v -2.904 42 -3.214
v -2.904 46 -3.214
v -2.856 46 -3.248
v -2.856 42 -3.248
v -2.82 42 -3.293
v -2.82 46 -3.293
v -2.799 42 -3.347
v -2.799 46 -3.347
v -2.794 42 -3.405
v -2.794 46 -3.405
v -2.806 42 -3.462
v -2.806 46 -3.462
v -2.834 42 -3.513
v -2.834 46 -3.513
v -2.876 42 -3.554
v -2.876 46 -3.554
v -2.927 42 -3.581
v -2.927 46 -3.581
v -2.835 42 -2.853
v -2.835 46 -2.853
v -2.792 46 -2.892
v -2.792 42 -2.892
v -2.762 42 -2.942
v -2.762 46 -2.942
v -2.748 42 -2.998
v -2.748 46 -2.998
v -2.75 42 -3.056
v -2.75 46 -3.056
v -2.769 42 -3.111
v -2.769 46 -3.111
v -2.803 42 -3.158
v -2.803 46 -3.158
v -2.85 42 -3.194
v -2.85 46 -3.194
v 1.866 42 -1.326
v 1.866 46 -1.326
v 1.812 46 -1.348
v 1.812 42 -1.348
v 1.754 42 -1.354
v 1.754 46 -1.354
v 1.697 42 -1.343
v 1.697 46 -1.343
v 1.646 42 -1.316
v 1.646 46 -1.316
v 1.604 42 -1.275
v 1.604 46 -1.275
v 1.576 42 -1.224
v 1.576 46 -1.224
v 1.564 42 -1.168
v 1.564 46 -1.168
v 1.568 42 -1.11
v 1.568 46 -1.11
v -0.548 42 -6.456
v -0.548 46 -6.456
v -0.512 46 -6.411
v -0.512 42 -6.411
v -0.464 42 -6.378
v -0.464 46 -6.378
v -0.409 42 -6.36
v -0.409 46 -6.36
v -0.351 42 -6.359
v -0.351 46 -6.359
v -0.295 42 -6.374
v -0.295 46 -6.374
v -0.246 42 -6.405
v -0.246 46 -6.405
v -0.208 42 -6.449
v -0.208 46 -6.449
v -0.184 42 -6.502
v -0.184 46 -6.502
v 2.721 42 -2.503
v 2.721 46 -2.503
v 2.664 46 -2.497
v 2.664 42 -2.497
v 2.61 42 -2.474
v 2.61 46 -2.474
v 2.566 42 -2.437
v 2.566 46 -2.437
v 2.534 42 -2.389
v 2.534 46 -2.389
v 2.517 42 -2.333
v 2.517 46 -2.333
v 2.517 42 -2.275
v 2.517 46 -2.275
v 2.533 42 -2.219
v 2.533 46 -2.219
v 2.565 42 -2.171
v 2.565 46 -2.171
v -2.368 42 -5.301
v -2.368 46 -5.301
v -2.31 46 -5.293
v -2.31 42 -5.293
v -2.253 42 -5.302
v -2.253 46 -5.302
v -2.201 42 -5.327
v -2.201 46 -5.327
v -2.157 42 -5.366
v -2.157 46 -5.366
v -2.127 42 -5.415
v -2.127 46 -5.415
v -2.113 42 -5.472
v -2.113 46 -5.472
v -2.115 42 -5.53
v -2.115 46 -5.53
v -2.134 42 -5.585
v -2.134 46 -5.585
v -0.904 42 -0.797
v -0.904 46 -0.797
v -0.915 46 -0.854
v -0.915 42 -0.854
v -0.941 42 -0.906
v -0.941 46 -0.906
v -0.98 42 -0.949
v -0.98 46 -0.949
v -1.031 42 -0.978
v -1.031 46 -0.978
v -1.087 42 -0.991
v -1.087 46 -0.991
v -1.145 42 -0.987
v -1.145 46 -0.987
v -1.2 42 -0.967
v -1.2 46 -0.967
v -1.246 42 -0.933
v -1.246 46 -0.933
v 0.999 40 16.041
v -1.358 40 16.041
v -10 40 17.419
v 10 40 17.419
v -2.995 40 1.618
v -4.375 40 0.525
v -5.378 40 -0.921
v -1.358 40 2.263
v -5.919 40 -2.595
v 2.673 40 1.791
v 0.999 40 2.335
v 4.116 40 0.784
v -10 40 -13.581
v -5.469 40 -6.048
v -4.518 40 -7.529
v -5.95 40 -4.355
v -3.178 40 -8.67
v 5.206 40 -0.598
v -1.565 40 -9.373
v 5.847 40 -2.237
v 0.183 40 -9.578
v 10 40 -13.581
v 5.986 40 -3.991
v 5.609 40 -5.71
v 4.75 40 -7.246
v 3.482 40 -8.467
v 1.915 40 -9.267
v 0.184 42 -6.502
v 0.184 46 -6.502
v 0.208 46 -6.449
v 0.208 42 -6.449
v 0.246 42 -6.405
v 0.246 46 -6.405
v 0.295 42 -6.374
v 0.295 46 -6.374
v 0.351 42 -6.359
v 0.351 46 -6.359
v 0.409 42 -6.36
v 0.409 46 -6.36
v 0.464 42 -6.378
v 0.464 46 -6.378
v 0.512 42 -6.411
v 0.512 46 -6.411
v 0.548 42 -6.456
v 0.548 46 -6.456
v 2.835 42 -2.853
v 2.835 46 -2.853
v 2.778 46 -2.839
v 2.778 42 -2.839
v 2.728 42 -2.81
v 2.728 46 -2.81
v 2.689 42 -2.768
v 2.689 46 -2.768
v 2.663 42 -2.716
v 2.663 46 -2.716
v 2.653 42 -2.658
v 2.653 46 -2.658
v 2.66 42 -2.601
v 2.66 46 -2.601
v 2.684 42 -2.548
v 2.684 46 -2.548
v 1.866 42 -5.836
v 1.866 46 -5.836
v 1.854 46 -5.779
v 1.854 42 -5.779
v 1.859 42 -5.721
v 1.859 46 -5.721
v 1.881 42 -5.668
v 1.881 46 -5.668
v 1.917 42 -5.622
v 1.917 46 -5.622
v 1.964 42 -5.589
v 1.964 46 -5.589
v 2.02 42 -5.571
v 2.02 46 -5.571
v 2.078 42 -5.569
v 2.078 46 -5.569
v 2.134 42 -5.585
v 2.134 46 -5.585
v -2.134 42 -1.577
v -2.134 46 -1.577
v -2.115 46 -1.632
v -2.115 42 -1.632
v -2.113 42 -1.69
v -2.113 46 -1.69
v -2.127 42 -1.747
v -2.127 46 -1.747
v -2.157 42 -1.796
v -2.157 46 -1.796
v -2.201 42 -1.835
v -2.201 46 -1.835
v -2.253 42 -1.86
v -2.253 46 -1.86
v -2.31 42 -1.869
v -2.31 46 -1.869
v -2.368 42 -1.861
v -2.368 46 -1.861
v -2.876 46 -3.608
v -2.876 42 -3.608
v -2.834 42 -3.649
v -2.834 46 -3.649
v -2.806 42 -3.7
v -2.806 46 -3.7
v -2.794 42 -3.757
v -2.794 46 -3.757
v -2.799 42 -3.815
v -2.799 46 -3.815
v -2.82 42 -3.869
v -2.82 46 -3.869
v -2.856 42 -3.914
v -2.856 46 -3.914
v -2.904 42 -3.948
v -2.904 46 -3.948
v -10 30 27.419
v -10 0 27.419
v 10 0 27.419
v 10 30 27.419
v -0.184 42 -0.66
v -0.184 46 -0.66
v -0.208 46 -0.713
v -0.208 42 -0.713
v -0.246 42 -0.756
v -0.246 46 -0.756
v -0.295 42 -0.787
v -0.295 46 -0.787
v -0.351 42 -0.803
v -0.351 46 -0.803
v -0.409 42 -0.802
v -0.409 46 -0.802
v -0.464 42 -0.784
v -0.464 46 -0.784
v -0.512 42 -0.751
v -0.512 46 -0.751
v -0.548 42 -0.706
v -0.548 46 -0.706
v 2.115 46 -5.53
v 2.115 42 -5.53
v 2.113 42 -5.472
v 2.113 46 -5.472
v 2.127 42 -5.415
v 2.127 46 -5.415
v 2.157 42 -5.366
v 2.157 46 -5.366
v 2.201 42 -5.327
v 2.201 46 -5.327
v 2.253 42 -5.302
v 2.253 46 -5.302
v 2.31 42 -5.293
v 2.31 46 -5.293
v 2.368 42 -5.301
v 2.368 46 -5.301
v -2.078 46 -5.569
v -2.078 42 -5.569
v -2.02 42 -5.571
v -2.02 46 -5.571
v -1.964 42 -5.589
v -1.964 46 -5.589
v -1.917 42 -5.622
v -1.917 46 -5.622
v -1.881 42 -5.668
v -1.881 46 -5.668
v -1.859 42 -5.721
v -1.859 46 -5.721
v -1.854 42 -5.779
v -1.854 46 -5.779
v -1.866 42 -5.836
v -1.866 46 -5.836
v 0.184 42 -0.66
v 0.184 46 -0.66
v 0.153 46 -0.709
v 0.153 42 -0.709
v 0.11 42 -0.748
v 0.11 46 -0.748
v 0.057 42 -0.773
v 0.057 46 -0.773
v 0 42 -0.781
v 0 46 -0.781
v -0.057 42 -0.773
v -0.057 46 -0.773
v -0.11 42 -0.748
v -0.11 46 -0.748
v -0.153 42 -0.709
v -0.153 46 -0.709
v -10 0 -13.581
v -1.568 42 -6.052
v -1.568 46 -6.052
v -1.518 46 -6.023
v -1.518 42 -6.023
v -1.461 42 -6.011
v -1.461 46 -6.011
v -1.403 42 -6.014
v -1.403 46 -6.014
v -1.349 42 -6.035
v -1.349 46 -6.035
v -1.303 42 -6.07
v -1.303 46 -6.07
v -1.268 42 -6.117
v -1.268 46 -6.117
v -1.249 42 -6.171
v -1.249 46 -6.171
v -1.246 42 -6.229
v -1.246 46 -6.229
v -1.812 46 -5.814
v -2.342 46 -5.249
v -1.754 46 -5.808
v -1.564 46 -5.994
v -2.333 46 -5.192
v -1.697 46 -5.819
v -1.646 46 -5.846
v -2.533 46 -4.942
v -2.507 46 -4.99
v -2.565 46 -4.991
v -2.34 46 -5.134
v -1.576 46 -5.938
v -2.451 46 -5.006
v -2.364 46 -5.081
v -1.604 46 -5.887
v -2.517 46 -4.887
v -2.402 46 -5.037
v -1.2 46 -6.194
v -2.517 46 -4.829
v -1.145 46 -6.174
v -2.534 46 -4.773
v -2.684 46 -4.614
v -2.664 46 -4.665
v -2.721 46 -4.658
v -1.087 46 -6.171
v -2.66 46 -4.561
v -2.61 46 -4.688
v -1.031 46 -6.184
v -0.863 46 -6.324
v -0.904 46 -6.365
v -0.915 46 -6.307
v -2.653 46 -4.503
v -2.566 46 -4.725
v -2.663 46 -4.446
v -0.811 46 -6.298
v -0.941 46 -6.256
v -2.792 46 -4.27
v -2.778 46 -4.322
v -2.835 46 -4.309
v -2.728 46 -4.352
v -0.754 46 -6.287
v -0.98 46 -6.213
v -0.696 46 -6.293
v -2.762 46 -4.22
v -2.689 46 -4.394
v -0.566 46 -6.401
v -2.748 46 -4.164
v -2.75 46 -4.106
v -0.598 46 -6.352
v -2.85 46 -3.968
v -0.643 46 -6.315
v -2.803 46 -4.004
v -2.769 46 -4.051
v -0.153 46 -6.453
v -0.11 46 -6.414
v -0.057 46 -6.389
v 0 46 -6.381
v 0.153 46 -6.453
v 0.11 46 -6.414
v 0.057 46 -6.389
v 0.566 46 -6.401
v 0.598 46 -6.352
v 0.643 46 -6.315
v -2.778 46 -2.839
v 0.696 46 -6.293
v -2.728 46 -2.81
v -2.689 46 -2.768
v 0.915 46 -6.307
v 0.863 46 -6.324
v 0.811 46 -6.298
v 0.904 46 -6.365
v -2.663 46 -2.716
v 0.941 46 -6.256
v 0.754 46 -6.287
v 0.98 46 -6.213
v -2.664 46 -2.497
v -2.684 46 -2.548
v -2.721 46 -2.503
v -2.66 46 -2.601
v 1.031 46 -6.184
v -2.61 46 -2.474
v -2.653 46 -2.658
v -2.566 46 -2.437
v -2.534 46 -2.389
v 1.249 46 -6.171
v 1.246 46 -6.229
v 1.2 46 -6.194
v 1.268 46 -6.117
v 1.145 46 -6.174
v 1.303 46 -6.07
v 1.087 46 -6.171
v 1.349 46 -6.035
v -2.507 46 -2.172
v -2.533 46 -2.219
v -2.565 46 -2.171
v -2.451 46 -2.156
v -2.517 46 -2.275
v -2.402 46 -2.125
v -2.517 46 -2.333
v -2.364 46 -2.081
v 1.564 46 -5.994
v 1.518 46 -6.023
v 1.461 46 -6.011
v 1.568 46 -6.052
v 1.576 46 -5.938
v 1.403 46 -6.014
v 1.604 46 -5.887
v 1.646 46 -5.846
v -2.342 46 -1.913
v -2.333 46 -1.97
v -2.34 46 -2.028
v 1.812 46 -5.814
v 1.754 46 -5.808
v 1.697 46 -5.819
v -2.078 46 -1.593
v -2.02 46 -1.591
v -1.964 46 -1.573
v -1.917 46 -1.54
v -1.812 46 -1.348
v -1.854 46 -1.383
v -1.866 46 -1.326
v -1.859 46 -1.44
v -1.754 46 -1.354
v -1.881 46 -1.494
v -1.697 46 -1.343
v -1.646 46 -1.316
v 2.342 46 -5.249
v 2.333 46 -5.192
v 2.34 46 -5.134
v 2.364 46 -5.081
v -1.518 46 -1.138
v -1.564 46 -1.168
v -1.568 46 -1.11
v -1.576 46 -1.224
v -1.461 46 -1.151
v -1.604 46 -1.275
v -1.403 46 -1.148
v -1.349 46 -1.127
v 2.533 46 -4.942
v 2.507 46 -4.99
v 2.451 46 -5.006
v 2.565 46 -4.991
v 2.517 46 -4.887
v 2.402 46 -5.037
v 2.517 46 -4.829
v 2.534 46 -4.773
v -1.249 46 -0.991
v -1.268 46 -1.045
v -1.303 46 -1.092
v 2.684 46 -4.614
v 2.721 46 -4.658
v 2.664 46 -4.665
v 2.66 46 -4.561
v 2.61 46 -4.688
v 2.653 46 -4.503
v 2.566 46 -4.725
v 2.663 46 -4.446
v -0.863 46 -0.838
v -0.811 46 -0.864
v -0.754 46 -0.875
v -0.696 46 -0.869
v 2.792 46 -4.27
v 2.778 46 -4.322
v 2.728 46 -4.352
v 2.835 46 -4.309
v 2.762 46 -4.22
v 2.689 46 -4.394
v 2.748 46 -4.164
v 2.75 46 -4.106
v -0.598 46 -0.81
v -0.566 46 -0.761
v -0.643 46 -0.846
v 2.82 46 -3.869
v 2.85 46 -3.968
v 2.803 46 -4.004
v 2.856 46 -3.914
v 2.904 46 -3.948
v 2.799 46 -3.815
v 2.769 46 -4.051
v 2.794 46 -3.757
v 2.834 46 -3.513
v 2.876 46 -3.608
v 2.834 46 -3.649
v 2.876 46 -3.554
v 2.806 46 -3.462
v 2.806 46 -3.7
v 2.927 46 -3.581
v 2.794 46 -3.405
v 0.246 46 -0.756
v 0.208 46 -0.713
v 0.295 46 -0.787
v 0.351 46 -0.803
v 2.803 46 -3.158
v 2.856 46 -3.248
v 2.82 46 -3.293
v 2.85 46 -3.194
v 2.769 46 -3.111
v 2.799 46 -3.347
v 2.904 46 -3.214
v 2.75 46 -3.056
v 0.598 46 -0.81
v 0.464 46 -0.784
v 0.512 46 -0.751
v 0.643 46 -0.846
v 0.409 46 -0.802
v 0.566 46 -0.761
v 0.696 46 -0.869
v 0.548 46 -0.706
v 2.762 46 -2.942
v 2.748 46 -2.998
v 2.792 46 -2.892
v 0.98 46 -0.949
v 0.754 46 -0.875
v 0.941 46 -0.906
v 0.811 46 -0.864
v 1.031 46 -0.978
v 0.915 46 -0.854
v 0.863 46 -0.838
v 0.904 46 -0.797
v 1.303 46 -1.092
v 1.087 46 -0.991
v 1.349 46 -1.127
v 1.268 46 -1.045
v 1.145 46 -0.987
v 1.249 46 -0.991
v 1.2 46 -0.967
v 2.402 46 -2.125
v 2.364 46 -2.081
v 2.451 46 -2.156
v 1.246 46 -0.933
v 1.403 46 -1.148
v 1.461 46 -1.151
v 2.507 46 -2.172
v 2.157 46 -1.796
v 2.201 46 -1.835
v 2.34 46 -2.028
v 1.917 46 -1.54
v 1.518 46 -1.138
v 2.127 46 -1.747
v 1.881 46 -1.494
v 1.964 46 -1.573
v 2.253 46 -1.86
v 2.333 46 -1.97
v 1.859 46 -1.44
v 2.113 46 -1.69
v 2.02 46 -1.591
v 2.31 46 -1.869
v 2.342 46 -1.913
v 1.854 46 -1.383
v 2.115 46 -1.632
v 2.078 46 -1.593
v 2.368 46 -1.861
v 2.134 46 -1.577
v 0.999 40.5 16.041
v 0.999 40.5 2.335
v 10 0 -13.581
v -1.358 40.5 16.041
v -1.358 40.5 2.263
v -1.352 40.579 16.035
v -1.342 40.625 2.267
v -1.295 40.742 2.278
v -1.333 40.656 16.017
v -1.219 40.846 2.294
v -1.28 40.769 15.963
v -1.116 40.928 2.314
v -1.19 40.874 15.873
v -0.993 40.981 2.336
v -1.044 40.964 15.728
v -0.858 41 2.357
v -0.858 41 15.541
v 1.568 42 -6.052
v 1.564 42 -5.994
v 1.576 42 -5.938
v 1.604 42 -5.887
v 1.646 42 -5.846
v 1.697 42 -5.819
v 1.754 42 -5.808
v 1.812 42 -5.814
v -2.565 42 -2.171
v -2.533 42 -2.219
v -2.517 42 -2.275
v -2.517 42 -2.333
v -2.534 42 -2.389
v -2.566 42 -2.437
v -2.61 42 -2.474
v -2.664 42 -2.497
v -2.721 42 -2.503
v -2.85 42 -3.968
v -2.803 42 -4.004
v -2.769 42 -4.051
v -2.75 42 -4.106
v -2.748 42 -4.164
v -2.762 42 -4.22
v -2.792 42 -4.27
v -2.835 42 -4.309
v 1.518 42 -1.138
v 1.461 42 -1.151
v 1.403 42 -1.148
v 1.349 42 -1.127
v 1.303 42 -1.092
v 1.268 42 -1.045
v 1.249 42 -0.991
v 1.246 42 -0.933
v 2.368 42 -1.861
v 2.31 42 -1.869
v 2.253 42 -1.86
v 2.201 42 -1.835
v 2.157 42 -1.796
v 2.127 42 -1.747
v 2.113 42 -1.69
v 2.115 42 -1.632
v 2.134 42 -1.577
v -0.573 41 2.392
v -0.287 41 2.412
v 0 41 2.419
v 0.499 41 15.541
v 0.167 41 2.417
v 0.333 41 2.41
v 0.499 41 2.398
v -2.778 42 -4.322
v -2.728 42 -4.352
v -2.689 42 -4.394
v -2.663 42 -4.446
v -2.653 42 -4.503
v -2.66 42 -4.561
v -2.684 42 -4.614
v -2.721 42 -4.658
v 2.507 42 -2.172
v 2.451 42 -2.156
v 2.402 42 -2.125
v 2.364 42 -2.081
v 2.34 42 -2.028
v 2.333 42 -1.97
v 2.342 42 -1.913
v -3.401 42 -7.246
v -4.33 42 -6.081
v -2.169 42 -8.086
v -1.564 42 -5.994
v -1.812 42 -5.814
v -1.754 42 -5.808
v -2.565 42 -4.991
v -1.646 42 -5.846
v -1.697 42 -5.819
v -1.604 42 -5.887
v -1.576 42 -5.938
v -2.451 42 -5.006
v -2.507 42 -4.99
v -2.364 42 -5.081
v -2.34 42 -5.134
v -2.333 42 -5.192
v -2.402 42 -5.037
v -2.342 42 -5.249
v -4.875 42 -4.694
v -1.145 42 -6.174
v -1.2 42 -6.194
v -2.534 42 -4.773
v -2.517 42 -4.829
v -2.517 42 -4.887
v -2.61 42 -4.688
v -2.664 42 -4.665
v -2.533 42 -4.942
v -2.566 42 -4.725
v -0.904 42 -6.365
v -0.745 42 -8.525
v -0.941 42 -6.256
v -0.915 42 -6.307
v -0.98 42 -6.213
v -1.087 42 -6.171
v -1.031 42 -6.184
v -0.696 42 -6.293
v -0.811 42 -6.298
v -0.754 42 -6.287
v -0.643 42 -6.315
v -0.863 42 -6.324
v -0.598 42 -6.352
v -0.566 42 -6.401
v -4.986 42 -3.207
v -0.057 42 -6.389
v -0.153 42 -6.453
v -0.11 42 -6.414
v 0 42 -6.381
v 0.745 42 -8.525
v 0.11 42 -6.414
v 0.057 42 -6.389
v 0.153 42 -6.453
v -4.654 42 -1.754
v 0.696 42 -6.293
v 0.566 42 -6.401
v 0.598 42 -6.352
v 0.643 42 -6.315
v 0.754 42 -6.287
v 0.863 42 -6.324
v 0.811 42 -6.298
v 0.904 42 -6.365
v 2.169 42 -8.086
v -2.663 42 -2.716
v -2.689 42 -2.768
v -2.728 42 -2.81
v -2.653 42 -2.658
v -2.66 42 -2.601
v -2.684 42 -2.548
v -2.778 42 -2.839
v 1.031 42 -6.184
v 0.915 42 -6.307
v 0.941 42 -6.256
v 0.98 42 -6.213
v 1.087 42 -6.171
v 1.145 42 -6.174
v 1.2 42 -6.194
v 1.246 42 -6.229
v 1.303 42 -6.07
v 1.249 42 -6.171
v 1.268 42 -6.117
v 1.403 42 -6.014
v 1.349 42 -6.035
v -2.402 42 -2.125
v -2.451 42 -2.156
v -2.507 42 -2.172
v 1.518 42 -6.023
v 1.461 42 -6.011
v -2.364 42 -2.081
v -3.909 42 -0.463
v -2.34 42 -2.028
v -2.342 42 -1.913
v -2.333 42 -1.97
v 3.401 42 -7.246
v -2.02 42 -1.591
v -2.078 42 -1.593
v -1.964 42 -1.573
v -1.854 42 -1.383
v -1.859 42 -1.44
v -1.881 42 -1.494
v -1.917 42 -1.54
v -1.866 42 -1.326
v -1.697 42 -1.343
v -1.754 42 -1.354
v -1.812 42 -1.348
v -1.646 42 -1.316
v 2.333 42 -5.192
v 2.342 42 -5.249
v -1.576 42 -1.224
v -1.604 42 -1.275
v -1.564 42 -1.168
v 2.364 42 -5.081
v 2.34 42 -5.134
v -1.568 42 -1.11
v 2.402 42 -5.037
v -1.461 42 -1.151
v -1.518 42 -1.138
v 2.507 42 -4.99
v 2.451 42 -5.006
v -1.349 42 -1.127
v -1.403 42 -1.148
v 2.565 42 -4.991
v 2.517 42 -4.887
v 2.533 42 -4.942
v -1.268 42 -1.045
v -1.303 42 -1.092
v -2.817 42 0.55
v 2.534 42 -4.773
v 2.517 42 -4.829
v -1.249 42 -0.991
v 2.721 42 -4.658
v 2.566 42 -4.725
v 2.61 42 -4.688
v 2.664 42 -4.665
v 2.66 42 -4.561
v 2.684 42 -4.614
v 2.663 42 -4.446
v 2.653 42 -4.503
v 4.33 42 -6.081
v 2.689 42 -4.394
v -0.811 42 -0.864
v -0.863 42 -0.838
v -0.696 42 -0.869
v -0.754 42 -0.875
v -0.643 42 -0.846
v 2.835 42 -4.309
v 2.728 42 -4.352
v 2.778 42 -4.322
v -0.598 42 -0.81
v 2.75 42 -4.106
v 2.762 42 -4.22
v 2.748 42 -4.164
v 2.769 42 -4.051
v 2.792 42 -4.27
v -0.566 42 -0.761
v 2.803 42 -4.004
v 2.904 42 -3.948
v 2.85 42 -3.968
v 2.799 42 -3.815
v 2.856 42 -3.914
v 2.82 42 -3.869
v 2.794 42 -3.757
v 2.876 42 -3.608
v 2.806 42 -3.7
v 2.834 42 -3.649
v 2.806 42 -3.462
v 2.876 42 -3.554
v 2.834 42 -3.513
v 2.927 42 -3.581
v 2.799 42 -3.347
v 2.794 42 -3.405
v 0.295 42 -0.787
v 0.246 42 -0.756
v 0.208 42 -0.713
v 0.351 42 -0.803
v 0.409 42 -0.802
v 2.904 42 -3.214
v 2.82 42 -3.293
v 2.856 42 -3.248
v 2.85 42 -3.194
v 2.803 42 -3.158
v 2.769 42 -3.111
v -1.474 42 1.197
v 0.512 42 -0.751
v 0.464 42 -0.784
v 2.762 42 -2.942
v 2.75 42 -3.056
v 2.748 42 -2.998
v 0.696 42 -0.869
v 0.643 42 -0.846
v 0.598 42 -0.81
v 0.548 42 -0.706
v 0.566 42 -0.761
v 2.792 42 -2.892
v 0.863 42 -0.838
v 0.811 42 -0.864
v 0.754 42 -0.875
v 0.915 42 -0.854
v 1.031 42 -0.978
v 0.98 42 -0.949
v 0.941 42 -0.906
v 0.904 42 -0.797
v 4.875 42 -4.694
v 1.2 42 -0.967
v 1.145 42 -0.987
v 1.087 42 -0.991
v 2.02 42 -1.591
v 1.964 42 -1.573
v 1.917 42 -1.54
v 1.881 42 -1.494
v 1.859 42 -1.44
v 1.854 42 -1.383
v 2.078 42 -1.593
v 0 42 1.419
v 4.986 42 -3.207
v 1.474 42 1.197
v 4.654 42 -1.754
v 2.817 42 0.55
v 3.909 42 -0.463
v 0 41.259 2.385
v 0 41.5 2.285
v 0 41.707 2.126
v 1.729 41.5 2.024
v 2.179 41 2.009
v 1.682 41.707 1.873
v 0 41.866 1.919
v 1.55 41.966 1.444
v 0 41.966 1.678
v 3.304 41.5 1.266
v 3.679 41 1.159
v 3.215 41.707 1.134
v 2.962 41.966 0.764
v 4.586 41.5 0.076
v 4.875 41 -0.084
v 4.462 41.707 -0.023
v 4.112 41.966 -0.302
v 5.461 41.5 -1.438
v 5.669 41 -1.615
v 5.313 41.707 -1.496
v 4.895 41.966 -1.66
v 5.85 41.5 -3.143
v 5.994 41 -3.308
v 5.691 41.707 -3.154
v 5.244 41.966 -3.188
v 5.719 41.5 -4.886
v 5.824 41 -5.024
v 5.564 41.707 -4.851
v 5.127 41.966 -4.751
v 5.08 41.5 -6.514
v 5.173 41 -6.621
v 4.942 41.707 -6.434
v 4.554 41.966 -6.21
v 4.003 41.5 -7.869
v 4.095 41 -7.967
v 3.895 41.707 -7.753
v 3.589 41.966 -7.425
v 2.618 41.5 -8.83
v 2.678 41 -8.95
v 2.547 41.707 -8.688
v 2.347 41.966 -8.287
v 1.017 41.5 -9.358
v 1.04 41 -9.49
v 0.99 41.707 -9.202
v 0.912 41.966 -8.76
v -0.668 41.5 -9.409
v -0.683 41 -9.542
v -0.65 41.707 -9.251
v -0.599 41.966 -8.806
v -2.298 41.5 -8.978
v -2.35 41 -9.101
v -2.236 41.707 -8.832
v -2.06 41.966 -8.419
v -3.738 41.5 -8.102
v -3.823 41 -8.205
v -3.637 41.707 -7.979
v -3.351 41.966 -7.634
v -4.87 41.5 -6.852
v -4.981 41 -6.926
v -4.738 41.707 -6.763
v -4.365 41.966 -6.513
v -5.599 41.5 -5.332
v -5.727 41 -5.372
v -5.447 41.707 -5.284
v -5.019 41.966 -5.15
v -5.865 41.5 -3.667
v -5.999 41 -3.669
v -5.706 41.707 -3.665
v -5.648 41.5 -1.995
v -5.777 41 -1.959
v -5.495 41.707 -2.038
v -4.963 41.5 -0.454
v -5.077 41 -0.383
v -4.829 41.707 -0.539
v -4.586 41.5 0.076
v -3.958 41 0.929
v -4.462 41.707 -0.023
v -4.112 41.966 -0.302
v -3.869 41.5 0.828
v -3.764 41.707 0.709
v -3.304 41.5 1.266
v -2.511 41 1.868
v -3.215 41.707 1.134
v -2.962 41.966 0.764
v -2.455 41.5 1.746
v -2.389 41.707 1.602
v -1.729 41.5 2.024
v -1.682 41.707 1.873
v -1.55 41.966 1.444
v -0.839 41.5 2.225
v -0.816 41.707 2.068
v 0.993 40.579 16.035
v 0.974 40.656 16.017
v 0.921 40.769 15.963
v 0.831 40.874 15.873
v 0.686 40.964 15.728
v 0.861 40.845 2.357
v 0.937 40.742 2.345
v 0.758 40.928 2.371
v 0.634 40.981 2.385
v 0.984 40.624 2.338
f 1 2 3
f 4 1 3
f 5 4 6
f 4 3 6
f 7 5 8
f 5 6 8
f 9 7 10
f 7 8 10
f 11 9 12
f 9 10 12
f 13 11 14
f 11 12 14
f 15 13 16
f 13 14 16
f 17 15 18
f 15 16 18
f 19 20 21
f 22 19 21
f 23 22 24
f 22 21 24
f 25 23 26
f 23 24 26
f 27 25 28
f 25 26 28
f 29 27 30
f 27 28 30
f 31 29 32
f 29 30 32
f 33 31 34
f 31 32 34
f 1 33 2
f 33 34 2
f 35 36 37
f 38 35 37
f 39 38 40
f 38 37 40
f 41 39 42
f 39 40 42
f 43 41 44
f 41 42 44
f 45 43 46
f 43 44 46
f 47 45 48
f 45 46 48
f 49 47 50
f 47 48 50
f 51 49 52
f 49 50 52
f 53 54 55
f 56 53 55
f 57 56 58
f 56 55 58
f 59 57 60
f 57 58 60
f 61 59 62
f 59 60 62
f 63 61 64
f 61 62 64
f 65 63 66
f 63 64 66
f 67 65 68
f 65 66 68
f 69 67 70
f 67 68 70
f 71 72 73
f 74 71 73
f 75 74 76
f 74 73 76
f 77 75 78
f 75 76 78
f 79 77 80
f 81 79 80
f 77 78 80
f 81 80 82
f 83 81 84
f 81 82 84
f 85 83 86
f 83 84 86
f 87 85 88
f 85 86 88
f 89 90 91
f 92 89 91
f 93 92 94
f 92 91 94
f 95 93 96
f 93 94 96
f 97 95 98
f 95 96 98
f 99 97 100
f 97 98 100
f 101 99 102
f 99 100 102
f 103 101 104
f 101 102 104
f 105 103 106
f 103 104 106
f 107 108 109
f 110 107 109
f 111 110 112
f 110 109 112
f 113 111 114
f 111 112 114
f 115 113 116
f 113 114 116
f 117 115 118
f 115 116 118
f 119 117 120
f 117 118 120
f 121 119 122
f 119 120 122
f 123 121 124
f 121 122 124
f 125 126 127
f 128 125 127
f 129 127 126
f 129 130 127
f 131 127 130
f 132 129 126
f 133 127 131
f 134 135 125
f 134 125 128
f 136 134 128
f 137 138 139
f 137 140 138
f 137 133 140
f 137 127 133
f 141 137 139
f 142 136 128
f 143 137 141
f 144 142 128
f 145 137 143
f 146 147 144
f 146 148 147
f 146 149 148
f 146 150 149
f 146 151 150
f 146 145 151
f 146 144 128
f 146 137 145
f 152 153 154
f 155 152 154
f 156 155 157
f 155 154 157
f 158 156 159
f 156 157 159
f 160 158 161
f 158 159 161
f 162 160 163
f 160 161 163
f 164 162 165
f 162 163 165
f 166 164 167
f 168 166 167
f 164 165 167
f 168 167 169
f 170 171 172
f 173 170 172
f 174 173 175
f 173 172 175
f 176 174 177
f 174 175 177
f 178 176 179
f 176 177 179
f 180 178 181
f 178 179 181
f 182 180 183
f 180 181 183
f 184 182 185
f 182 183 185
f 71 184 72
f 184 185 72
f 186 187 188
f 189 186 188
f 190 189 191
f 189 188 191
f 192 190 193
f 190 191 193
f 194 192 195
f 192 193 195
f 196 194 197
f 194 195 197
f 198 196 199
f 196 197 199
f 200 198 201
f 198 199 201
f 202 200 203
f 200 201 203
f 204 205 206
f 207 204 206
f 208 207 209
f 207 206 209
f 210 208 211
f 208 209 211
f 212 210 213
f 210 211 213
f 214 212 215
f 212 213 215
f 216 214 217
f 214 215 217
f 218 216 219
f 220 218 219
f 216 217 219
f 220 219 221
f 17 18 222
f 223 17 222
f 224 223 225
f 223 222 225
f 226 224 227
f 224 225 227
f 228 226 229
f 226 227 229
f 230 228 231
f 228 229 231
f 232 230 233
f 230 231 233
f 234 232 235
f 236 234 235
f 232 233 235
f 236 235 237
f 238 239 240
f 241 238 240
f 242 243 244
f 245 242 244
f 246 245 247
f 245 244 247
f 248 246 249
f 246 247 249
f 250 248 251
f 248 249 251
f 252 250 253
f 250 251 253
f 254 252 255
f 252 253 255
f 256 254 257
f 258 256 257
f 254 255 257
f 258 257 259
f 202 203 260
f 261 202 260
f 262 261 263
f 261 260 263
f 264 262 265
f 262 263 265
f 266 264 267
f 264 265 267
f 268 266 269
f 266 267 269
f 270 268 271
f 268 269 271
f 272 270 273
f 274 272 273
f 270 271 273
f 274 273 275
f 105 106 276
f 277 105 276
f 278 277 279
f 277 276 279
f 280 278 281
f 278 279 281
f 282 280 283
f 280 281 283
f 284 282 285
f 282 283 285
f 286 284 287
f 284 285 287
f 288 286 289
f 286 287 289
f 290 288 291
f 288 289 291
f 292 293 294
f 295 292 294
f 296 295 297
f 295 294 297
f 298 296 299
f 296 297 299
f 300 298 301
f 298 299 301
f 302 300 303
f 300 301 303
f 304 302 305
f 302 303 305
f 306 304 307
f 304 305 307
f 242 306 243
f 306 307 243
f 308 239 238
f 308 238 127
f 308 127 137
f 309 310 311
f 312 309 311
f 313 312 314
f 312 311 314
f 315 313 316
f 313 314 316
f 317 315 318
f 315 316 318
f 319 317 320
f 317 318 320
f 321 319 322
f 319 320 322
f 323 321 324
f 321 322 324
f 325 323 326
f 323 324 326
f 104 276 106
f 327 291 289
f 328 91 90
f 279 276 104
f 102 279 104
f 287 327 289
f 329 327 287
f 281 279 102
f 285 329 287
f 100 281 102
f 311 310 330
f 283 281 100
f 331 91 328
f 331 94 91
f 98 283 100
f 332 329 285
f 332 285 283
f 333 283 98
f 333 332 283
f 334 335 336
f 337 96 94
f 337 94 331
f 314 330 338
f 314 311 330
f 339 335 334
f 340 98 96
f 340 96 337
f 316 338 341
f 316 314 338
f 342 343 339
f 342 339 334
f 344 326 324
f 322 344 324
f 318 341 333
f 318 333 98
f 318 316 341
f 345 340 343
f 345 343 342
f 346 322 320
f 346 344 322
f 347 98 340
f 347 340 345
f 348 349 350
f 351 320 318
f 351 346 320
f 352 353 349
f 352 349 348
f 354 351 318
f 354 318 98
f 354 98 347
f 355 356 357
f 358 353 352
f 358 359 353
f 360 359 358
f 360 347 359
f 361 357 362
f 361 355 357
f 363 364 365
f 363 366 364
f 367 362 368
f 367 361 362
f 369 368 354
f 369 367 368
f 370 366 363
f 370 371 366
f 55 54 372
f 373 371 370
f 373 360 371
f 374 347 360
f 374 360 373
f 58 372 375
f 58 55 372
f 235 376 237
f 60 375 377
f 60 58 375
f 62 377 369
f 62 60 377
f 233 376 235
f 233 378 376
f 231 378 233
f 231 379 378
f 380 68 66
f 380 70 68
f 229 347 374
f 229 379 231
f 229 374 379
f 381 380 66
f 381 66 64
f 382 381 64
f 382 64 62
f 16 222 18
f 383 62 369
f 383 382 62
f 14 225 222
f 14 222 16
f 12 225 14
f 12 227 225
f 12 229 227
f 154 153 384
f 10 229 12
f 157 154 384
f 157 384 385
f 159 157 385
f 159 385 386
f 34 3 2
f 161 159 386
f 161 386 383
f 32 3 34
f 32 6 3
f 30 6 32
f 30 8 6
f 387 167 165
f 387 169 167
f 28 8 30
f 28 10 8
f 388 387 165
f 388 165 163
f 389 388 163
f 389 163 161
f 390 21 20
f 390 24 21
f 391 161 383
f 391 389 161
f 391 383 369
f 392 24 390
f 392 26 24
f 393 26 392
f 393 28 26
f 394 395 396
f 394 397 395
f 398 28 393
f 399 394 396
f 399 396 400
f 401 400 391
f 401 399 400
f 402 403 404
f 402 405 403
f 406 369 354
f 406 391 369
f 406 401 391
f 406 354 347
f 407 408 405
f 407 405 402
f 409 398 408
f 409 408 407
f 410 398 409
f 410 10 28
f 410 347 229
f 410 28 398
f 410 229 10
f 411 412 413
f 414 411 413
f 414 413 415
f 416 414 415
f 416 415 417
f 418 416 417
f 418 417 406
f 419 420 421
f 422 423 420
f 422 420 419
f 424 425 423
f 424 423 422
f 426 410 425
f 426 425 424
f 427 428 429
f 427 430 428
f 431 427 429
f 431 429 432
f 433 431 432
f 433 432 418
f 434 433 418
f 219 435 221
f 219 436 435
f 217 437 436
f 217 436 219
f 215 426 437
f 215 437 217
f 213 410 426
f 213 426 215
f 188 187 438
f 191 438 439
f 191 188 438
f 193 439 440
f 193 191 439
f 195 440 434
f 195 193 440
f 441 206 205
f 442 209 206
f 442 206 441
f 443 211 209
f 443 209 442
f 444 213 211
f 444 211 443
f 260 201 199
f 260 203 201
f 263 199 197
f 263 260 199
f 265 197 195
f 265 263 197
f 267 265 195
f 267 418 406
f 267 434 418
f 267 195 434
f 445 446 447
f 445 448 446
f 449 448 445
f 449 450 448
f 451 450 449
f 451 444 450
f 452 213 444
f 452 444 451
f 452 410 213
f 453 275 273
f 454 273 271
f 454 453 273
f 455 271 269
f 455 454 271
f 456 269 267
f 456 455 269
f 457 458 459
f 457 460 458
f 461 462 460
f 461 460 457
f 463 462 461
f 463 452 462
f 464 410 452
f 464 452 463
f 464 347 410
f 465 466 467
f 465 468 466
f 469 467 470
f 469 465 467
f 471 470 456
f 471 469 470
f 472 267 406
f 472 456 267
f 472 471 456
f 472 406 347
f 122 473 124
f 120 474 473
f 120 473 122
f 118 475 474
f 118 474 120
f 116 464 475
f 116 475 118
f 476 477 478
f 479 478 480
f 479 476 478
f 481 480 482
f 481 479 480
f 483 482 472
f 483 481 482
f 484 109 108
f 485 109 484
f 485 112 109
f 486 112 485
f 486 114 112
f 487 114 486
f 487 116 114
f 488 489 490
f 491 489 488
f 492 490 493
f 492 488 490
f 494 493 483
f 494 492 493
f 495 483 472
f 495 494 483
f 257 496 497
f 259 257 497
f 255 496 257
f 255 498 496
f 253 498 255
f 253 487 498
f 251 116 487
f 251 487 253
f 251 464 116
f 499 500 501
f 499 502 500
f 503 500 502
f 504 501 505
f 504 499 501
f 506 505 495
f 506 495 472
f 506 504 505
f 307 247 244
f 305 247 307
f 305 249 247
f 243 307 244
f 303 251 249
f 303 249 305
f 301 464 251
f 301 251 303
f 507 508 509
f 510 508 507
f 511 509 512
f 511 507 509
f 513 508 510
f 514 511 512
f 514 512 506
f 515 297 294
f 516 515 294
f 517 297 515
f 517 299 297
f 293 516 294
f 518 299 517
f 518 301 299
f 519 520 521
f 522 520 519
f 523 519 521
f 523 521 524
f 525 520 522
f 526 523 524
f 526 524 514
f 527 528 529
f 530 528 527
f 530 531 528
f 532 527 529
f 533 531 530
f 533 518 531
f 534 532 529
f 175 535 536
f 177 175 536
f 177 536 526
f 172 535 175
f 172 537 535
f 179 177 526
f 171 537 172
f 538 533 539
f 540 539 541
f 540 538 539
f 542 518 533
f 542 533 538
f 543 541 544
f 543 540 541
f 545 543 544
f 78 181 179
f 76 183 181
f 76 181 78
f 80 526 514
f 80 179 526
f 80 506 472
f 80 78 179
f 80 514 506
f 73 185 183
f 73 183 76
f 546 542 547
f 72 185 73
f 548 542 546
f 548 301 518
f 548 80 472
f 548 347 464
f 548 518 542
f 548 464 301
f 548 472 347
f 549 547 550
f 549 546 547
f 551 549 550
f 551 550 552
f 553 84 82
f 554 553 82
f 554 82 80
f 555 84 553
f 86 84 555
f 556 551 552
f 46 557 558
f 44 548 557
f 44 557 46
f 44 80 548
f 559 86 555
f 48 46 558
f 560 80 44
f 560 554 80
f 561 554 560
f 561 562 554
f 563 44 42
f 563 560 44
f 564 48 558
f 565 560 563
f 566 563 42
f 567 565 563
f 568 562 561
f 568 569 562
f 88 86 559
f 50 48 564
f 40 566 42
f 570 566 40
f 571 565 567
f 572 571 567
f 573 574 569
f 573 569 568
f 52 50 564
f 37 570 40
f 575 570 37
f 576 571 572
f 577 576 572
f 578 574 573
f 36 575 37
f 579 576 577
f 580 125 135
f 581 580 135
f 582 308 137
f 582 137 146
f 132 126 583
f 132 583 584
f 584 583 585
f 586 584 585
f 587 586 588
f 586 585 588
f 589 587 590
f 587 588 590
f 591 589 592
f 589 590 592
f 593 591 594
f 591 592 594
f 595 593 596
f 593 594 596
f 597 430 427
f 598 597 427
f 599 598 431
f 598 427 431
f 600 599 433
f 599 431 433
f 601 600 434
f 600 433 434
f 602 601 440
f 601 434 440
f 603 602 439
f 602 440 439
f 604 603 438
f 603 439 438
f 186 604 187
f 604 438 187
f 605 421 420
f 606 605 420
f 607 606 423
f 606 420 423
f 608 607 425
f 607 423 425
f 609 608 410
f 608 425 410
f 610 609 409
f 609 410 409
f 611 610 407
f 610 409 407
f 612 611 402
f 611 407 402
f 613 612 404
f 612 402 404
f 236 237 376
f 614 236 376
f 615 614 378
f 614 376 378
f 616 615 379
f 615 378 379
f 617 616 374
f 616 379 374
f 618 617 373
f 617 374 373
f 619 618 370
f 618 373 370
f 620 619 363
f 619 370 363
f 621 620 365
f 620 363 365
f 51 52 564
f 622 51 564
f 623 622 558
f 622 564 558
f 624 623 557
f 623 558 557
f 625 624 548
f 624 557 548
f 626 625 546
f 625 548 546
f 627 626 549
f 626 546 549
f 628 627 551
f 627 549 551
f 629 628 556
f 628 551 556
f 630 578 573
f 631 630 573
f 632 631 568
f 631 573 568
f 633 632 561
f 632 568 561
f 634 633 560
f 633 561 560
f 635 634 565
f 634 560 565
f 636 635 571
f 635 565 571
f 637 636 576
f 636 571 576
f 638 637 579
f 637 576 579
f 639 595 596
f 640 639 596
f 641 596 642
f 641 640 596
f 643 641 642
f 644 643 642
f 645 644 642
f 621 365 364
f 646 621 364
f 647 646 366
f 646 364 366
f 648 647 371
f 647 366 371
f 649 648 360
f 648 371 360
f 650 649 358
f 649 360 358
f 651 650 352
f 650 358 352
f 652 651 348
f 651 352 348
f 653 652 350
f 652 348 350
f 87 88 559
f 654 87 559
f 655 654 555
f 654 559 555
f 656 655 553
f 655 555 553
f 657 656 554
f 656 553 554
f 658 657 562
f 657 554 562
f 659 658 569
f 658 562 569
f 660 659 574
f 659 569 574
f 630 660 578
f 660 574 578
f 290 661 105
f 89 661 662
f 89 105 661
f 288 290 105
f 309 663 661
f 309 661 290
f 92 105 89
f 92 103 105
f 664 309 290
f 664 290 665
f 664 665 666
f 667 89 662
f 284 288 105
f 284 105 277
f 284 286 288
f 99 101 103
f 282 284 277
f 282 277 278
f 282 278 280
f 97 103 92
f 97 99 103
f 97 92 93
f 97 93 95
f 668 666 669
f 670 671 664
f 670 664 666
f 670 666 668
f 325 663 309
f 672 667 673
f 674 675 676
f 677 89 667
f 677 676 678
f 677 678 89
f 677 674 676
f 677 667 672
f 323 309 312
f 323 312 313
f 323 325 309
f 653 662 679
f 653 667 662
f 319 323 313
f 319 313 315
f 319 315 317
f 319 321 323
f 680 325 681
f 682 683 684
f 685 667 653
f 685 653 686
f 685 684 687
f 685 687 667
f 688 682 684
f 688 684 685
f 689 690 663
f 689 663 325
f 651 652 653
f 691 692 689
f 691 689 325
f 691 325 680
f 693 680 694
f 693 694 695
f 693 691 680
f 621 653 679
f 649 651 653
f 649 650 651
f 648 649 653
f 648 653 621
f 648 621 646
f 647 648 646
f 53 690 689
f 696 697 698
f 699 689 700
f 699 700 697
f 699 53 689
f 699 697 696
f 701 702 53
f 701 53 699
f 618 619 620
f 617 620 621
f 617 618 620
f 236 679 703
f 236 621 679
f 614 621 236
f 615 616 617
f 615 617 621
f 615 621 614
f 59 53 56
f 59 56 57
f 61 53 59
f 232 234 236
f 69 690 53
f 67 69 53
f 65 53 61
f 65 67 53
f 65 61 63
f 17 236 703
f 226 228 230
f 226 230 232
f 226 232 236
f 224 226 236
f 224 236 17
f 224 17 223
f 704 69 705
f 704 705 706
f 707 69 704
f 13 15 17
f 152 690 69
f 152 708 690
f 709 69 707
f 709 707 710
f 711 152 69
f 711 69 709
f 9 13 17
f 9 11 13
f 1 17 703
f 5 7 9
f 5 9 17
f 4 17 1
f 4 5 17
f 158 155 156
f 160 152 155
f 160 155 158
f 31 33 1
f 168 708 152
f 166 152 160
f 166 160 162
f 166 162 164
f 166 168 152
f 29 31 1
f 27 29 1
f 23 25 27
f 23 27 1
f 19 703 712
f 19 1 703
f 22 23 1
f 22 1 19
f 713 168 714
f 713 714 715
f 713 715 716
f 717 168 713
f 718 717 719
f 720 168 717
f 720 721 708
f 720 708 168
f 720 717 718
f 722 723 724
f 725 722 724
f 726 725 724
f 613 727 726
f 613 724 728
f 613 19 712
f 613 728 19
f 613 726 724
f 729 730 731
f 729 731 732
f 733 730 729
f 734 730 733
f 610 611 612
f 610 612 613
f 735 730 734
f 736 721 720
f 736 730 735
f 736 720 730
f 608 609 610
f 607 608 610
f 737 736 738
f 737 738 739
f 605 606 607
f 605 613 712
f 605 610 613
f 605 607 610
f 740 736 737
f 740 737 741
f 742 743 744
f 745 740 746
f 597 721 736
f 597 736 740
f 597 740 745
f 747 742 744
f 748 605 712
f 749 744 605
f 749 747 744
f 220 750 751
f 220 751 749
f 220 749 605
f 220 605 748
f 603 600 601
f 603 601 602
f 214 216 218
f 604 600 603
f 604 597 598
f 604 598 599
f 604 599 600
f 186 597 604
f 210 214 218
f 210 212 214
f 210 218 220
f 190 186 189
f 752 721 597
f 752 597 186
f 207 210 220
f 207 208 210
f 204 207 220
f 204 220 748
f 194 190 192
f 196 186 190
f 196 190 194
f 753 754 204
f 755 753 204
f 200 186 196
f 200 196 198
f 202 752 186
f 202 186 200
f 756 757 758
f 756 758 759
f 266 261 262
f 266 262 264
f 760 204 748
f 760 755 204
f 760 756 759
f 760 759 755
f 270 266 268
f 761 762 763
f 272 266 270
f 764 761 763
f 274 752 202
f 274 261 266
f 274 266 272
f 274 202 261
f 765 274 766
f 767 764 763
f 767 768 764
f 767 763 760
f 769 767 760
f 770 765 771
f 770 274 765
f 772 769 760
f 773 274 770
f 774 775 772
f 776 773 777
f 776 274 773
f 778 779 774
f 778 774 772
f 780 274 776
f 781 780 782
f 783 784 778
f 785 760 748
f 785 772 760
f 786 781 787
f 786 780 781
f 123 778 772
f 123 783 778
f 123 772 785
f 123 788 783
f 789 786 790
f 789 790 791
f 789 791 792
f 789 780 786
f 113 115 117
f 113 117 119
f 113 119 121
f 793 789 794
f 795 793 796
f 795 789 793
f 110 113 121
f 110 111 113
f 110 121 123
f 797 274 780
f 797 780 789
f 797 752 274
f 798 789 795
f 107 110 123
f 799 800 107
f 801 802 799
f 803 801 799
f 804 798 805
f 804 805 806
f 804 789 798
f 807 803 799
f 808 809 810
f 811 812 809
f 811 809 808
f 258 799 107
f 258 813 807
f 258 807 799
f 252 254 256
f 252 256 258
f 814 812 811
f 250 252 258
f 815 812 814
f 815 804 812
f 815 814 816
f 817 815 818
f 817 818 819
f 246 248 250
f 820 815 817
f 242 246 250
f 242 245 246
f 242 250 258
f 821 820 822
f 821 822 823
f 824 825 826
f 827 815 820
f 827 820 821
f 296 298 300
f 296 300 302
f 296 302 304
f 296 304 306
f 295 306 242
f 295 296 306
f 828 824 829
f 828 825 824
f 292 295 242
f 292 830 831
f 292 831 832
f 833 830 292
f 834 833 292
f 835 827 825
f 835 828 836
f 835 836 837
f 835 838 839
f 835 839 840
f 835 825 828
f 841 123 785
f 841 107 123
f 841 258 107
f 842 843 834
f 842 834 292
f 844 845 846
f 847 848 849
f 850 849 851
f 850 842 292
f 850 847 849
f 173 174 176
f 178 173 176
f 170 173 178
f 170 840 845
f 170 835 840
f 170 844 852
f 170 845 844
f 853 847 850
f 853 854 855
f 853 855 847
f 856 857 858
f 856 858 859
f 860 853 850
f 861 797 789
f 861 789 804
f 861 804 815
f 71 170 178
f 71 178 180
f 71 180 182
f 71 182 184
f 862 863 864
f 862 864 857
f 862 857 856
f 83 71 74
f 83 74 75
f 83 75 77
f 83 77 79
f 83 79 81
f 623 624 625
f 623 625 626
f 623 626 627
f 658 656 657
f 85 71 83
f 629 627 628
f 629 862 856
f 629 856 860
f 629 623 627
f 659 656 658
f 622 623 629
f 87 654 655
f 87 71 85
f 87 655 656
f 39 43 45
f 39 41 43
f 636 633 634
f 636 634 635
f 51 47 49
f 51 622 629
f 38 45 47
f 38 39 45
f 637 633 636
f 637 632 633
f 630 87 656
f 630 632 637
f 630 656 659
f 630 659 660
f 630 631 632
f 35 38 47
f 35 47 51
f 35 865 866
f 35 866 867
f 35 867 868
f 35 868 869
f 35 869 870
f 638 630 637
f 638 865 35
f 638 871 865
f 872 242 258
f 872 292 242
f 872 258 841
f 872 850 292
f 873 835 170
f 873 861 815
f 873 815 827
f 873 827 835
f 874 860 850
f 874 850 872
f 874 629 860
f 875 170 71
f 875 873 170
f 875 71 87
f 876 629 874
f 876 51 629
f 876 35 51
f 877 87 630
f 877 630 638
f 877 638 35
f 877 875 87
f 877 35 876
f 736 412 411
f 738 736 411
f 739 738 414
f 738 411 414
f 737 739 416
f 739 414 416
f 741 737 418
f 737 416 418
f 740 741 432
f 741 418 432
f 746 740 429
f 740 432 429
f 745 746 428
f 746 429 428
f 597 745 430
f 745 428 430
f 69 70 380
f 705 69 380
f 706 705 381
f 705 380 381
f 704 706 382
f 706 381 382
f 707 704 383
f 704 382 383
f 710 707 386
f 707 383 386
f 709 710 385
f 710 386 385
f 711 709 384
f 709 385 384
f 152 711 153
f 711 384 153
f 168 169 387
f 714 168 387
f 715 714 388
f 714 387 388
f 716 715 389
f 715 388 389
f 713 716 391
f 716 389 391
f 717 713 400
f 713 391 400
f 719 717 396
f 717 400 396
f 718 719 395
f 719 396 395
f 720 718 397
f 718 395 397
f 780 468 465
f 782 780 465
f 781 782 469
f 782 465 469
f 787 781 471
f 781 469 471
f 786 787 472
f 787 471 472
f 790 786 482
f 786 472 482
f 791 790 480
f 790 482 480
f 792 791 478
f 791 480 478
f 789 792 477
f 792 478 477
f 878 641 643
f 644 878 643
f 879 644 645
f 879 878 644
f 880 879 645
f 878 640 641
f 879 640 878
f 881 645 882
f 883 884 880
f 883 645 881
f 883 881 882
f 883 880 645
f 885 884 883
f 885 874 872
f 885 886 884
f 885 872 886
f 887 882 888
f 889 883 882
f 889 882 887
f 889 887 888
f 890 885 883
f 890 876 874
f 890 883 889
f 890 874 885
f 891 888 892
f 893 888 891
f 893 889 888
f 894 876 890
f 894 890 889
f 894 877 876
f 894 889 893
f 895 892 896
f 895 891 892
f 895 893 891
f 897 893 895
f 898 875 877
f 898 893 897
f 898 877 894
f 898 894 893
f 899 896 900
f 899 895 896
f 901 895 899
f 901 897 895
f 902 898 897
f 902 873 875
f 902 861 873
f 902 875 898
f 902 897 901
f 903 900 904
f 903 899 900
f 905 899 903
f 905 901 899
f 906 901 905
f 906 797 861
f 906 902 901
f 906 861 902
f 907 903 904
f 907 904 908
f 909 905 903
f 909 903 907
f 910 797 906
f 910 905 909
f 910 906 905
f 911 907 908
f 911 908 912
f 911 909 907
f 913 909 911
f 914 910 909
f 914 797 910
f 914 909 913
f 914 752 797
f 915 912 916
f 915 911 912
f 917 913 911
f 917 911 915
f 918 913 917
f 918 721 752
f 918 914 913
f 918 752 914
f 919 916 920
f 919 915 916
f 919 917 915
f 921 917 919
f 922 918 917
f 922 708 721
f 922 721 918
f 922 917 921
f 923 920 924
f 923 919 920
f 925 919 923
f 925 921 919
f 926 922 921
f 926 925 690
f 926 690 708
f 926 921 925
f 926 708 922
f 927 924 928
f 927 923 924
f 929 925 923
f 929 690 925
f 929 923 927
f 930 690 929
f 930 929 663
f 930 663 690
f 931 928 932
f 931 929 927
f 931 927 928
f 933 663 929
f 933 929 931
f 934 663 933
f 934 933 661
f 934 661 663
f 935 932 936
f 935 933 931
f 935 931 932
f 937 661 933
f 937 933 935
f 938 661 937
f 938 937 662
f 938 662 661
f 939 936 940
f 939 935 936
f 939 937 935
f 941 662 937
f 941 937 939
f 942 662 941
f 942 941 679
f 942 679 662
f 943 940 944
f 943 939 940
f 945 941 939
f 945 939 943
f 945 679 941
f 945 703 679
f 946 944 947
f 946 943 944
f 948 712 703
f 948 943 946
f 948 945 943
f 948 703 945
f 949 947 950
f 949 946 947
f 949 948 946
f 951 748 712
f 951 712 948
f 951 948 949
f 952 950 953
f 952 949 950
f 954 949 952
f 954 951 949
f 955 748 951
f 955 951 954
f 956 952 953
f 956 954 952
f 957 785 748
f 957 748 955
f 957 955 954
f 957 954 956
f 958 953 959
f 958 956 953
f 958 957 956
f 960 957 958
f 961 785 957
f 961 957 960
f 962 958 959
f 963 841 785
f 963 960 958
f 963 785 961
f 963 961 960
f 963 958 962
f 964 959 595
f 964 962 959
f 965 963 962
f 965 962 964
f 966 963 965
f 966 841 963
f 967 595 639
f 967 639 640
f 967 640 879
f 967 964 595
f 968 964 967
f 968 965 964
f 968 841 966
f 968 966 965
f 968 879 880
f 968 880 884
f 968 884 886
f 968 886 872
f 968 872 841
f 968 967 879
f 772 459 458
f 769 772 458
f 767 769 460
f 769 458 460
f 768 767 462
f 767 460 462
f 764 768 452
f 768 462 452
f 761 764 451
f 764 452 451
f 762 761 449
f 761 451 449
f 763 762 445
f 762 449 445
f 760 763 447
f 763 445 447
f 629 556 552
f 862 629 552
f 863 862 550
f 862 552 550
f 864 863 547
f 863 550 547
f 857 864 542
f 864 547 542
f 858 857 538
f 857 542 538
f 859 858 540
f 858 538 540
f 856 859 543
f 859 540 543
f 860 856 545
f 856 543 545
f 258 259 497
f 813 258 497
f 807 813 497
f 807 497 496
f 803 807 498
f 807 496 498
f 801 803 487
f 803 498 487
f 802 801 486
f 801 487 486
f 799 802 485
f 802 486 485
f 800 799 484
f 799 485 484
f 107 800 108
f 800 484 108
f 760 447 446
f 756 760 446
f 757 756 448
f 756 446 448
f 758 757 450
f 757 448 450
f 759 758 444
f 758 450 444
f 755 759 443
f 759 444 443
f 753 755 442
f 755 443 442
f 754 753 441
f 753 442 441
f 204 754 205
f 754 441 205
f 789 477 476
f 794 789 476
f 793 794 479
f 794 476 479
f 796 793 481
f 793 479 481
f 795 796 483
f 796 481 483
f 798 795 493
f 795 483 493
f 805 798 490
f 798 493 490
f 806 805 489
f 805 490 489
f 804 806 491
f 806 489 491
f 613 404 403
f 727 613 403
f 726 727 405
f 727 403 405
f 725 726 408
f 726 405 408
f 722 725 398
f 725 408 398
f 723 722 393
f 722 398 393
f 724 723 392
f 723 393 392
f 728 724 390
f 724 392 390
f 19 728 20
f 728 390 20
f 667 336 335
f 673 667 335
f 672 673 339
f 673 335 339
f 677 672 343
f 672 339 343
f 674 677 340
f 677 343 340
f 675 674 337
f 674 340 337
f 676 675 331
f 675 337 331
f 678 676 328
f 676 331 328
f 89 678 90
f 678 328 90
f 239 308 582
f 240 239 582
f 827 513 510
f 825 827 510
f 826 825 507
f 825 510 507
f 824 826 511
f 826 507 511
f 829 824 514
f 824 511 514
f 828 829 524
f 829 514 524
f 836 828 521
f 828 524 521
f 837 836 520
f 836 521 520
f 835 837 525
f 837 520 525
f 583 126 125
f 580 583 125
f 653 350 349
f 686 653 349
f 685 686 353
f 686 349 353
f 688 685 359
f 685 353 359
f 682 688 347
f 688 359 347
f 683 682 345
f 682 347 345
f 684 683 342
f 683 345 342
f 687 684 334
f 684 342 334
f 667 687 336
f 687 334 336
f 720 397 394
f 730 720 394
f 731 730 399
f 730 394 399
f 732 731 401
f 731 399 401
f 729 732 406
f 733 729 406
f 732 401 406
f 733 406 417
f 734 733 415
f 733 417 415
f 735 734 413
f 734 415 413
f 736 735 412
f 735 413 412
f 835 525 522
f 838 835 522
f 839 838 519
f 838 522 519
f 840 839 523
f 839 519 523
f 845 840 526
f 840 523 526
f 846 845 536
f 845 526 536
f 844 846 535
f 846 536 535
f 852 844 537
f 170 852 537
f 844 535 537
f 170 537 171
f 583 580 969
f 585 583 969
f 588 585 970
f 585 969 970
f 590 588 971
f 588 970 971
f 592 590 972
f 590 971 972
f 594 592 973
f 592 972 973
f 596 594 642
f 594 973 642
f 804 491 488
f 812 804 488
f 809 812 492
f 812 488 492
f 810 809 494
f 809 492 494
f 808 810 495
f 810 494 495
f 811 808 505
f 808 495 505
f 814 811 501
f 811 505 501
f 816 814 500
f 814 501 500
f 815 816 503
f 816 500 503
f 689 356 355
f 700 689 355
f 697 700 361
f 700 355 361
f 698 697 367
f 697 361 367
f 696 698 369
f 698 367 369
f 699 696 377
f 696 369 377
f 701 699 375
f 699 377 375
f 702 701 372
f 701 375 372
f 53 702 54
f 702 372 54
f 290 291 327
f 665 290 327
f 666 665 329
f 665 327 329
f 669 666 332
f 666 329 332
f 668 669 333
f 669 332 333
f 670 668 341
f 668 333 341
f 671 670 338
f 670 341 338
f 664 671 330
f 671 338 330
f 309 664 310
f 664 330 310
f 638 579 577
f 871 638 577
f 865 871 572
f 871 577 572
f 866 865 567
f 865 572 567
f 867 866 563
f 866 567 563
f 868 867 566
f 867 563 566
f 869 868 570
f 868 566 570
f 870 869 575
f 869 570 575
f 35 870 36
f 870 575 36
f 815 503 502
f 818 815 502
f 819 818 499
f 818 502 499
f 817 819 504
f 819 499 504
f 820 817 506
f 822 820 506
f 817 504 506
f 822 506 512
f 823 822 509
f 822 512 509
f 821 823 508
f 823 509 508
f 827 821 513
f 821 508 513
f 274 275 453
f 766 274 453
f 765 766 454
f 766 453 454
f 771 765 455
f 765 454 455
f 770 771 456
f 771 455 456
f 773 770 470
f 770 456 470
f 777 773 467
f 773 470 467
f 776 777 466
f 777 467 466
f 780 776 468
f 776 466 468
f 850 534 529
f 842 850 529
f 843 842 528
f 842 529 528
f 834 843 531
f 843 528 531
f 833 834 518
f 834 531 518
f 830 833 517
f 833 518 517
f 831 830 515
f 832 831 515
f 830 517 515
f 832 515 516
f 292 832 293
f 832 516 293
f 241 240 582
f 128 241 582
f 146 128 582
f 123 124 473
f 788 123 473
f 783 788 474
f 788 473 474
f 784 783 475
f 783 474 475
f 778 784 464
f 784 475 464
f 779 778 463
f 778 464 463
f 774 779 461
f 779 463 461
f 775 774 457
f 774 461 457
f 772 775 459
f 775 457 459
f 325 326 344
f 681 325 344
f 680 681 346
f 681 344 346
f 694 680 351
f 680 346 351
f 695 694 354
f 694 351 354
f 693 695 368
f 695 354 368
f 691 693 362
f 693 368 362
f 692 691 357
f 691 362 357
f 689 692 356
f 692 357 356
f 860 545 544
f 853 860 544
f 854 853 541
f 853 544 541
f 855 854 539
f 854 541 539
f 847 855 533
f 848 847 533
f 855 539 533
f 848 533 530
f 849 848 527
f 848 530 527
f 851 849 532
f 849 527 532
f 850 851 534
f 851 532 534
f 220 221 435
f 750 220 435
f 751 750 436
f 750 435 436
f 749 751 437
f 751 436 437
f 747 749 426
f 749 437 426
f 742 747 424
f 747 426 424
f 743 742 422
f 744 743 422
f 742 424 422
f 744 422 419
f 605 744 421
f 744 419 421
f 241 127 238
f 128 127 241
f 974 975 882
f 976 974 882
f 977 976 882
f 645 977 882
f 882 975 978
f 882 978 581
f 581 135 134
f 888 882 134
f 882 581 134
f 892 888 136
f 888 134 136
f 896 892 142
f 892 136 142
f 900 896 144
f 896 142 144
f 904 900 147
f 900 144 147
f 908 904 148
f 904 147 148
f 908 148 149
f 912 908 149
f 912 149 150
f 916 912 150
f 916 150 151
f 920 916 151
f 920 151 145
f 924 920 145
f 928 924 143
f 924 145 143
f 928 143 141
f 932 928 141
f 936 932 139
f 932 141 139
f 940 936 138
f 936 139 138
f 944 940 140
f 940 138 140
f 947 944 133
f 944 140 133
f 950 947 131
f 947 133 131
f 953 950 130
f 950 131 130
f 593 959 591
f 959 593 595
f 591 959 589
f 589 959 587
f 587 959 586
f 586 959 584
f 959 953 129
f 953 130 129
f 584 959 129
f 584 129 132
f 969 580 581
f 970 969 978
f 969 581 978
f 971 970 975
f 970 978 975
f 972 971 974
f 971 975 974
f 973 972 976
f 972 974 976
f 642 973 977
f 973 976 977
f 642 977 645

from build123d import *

# Parameters (mm, degrees)
SKETCH1_W           = 20
SKETCH1_H           = 41
BOSS_EXTRUDE1_DEPTH = 40
CHAMFER1_SIZE       = 10
SKETCH2_R           = 6
BOSS_EXTRUDE2_DEPTH = 2
FILLET1_R           = 1
SKETCH3_W           = 2.35715975
SKETCH3_H           = 15.320908912
BOSS_EXTRUDE3_DEPTH = 1
FILLET2_R           = 0.5
SKETCH4_R           = 3
BOSS_EXTRUDE4_DEPTH = 4
SKETCH5_R           = 0.2
CUT_EXTRUDE1_DEPTH  = 4


with BuildPart() as part:
    # Sketch1 → Boss-Extrude1 (new body)
    with BuildSketch(Plane(origin=(0, 0, 0), x_dir=(1, 0, 0), z_dir=(0, 1, 0))):
        with Locations((0, -6.919054605)):
            Rectangle(SKETCH1_W, SKETCH1_H)
    extrude(amount=BOSS_EXTRUDE1_DEPTH)

    # Chamfer1
    chamfer1_edges = [part.edges().sort_by_distance(p)[0] for p in [
        (0, 40, 27.419054605),
    ]]
    chamfer(chamfer1_edges, length=CHAMFER1_SIZE)

    # Sketch2 → Boss-Extrude2 (add)
    with BuildSketch(Plane(origin=(0, 40, 0), x_dir=(1, 0, 0), z_dir=(0, 1, 0))):
        with Locations(Location((0, 3.580945395, 0), (0, 0, 270))):
            Circle(SKETCH2_R)
    extrude(amount=BOSS_EXTRUDE2_DEPTH)

    # Fillet1
    fillet1_edges = [part.edges().sort_by_distance(p)[0] for p in [
        (0, 42, -9.580945395),
    ]]
    fillet(fillet1_edges, radius=FILLET1_R)

    # Sketch3 → Boss-Extrude3 (add)
    with BuildSketch(Plane(origin=(0, 40, 0), x_dir=(1, 0, 0), z_dir=(0, 1, 0))):
        with Locations((-0.179276882, -8.380978437)):
            Rectangle(SKETCH3_W, SKETCH3_H)
    extrude(amount=BOSS_EXTRUDE3_DEPTH)

    # Fillet2
    # the kernel refuses this fillet: 0.5 mm, written as the material it takes off along each edge
    with BuildSketch(Plane(origin=(0.999302993, 41, 1.085252162), x_dir=(-1, 0, 0), z_dir=(0, 0, 1))) as fillet2_piece_1_section:
        with BuildLine():
            CenterArc((FILLET2_R, FILLET2_R), FILLET2_R, 180, 90)
            Line((0, FILLET2_R), (0, 0))
            Line((0, 0), (FILLET2_R, 0))
        make_face()
    fillet2_piece_1 = extrude(amount=16.206180731, mode=Mode.PRIVATE)
    fillet2_piece_1 = fillet2_piece_1 - Plane(origin=(0, 40.888261374, -3.580945395), x_dir=(0, 0, 1), z_dir=(0, -1, 0)) * Cylinder(6, 35, mode=Mode.PRIVATE)
    add(fillet2_piece_1, mode=Mode.SUBTRACT)
    with BuildSketch(Plane(origin=(-1.357856757, 41, 17.291432893), x_dir=(1, 0, 0), z_dir=(0, 0, -1))) as fillet2_piece_2_section:
        with BuildLine():
            CenterArc((FILLET2_R, FILLET2_R), FILLET2_R, 180, 90)
            Line((0, FILLET2_R), (0, 0))
            Line((0, 0), (FILLET2_R, 0))
        make_face()
    fillet2_piece_2 = extrude(amount=16.27804556, mode=Mode.PRIVATE)
    fillet2_piece_2 = fillet2_piece_2 - Plane(origin=(0, 40.888238096, -3.580945395), x_dir=(0, 0, 1), z_dir=(0, -1, 0)) * Cylinder(6, 35, mode=Mode.PRIVATE)
    add(fillet2_piece_2, mode=Mode.SUBTRACT)
    with BuildSketch(Plane(origin=(2.249302993, 41, 16.041432893), x_dir=(0, 0, -1), z_dir=(-1, 0, 0))) as fillet2_piece_3:
        with BuildLine():
            CenterArc((FILLET2_R, FILLET2_R), FILLET2_R, 180, 90)
            Line((0, FILLET2_R), (0, 0))
            Line((0, 0), (FILLET2_R, 0))
        make_face()
    extrude(amount=4.85715975, mode=Mode.SUBTRACT)

    # Sketch4 → Boss-Extrude4 (add)
    with BuildSketch(Plane(origin=(0, 42, 0), x_dir=(1, 0, 0), z_dir=(0, 1, 0))):
        with Locations(Location((0, 3.580945395, 0), (0, 0, 270))):
            Circle(SKETCH4_R)
    extrude(amount=BOSS_EXTRUDE4_DEPTH)

    # Sketch5 → Cut-Extrude1 (cut)
    with BuildSketch(Plane(origin=(0, 46, 0), x_dir=(1, 0, 0), z_dir=(0, 1, 0))):
        with Locations((0, 0.580945395)):
            Circle(SKETCH5_R)
        with Locations((-0.375999701, 0.604601291)):
            Circle(SKETCH5_R)
        with Locations((-0.746069661, 0.675195911)):
            Circle(SKETCH5_R)
        with Locations((-1.104373658, 0.791615937)):
            Circle(SKETCH5_R)
        with Locations((-1.445261022, 0.952025355)):
            Circle(SKETCH5_R)
        with Locations((-1.763355757, 1.153894412)):
            Circle(SKETCH5_R)
        with Locations((-2.053641318, 1.394039512)):
            Circle(SKETCH5_R)
        with Locations((-2.311539728, 1.668673425)):
            Circle(SKETCH5_R)
        with Locations((-2.532983777, 1.97346501)):
            Circle(SKETCH5_R)
        with Locations((-2.714481157, 2.30360752)):
            Circle(SKETCH5_R)
        with Locations((-2.853169549, 2.653894412)):
            Circle(SKETCH5_R)
        with Locations((-2.946861752, 3.018801451)):
            Circle(SKETCH5_R)
        with Locations((-2.994080185, 3.392573836)):
            Circle(SKETCH5_R)
        with Locations((-2.994080185, 3.769316953)):
            Circle(SKETCH5_R)
        with Locations((-2.946861752, 4.143089338)):
            Circle(SKETCH5_R)
        with Locations((-2.853169549, 4.507996378)):
            Circle(SKETCH5_R)
        with Locations((-2.714481157, 4.858283269)):
            Circle(SKETCH5_R)
        with Locations((-2.532983777, 5.18842578)):
            Circle(SKETCH5_R)
        with Locations((-2.311539728, 5.493217364)):
            Circle(SKETCH5_R)
        with Locations((-2.053641318, 5.767851277)):
            Circle(SKETCH5_R)
        with Locations((-1.763355757, 6.007996378)):
            Circle(SKETCH5_R)
        with Locations((-1.445261022, 6.209865435)):
            Circle(SKETCH5_R)
        with Locations((-1.104373658, 6.370274852)):
            Circle(SKETCH5_R)
        with Locations((-0.746069661, 6.486694878)):
            Circle(SKETCH5_R)
        with Locations((-0.375999701, 6.557289499)):
            Circle(SKETCH5_R)
        with Locations((0, 6.580945395)):
            Circle(SKETCH5_R)
        with Locations((0.375999701, 6.557289499)):
            Circle(SKETCH5_R)
        with Locations((0.746069661, 6.486694878)):
            Circle(SKETCH5_R)
        with Locations((1.104373658, 6.370274852)):
            Circle(SKETCH5_R)
        with Locations((1.445261022, 6.209865435)):
            Circle(SKETCH5_R)
        with Locations((1.763355757, 6.007996378)):
            Circle(SKETCH5_R)
        with Locations((2.053641318, 5.767851277)):
            Circle(SKETCH5_R)
        with Locations((2.311539728, 5.493217364)):
            Circle(SKETCH5_R)
        with Locations((2.532983777, 5.18842578)):
            Circle(SKETCH5_R)
        with Locations((2.714481157, 4.858283269)):
            Circle(SKETCH5_R)
        with Locations((2.853169549, 4.507996378)):
            Circle(SKETCH5_R)
        with Locations((2.946861752, 4.143089338)):
            Circle(SKETCH5_R)
        with Locations((2.994080185, 3.769316953)):
            Circle(SKETCH5_R)
        with Locations((2.994080185, 3.392573836)):
            Circle(SKETCH5_R)
        with Locations((2.946861752, 3.018801451)):
            Circle(SKETCH5_R)
        with Locations((2.853169549, 2.653894412)):
            Circle(SKETCH5_R)
        with Locations((2.714481157, 2.30360752)):
            Circle(SKETCH5_R)
        with Locations((2.532983777, 1.97346501)):
            Circle(SKETCH5_R)
        with Locations((2.311539728, 1.668673425)):
            Circle(SKETCH5_R)
        with Locations((2.053641318, 1.394039512)):
            Circle(SKETCH5_R)
        with Locations((1.763355757, 1.153894412)):
            Circle(SKETCH5_R)
        with Locations((1.445261022, 0.952025355)):
            Circle(SKETCH5_R)
        with Locations((1.104373658, 0.791615937)):
            Circle(SKETCH5_R)
        with Locations((0.746069661, 0.675195911)):
            Circle(SKETCH5_R)
        with Locations((0.375999701, 0.604601291)):
            Circle(SKETCH5_R)
    extrude(amount=-CUT_EXTRUDE1_DEPTH, mode=Mode.SUBTRACT)


solid = part.part
